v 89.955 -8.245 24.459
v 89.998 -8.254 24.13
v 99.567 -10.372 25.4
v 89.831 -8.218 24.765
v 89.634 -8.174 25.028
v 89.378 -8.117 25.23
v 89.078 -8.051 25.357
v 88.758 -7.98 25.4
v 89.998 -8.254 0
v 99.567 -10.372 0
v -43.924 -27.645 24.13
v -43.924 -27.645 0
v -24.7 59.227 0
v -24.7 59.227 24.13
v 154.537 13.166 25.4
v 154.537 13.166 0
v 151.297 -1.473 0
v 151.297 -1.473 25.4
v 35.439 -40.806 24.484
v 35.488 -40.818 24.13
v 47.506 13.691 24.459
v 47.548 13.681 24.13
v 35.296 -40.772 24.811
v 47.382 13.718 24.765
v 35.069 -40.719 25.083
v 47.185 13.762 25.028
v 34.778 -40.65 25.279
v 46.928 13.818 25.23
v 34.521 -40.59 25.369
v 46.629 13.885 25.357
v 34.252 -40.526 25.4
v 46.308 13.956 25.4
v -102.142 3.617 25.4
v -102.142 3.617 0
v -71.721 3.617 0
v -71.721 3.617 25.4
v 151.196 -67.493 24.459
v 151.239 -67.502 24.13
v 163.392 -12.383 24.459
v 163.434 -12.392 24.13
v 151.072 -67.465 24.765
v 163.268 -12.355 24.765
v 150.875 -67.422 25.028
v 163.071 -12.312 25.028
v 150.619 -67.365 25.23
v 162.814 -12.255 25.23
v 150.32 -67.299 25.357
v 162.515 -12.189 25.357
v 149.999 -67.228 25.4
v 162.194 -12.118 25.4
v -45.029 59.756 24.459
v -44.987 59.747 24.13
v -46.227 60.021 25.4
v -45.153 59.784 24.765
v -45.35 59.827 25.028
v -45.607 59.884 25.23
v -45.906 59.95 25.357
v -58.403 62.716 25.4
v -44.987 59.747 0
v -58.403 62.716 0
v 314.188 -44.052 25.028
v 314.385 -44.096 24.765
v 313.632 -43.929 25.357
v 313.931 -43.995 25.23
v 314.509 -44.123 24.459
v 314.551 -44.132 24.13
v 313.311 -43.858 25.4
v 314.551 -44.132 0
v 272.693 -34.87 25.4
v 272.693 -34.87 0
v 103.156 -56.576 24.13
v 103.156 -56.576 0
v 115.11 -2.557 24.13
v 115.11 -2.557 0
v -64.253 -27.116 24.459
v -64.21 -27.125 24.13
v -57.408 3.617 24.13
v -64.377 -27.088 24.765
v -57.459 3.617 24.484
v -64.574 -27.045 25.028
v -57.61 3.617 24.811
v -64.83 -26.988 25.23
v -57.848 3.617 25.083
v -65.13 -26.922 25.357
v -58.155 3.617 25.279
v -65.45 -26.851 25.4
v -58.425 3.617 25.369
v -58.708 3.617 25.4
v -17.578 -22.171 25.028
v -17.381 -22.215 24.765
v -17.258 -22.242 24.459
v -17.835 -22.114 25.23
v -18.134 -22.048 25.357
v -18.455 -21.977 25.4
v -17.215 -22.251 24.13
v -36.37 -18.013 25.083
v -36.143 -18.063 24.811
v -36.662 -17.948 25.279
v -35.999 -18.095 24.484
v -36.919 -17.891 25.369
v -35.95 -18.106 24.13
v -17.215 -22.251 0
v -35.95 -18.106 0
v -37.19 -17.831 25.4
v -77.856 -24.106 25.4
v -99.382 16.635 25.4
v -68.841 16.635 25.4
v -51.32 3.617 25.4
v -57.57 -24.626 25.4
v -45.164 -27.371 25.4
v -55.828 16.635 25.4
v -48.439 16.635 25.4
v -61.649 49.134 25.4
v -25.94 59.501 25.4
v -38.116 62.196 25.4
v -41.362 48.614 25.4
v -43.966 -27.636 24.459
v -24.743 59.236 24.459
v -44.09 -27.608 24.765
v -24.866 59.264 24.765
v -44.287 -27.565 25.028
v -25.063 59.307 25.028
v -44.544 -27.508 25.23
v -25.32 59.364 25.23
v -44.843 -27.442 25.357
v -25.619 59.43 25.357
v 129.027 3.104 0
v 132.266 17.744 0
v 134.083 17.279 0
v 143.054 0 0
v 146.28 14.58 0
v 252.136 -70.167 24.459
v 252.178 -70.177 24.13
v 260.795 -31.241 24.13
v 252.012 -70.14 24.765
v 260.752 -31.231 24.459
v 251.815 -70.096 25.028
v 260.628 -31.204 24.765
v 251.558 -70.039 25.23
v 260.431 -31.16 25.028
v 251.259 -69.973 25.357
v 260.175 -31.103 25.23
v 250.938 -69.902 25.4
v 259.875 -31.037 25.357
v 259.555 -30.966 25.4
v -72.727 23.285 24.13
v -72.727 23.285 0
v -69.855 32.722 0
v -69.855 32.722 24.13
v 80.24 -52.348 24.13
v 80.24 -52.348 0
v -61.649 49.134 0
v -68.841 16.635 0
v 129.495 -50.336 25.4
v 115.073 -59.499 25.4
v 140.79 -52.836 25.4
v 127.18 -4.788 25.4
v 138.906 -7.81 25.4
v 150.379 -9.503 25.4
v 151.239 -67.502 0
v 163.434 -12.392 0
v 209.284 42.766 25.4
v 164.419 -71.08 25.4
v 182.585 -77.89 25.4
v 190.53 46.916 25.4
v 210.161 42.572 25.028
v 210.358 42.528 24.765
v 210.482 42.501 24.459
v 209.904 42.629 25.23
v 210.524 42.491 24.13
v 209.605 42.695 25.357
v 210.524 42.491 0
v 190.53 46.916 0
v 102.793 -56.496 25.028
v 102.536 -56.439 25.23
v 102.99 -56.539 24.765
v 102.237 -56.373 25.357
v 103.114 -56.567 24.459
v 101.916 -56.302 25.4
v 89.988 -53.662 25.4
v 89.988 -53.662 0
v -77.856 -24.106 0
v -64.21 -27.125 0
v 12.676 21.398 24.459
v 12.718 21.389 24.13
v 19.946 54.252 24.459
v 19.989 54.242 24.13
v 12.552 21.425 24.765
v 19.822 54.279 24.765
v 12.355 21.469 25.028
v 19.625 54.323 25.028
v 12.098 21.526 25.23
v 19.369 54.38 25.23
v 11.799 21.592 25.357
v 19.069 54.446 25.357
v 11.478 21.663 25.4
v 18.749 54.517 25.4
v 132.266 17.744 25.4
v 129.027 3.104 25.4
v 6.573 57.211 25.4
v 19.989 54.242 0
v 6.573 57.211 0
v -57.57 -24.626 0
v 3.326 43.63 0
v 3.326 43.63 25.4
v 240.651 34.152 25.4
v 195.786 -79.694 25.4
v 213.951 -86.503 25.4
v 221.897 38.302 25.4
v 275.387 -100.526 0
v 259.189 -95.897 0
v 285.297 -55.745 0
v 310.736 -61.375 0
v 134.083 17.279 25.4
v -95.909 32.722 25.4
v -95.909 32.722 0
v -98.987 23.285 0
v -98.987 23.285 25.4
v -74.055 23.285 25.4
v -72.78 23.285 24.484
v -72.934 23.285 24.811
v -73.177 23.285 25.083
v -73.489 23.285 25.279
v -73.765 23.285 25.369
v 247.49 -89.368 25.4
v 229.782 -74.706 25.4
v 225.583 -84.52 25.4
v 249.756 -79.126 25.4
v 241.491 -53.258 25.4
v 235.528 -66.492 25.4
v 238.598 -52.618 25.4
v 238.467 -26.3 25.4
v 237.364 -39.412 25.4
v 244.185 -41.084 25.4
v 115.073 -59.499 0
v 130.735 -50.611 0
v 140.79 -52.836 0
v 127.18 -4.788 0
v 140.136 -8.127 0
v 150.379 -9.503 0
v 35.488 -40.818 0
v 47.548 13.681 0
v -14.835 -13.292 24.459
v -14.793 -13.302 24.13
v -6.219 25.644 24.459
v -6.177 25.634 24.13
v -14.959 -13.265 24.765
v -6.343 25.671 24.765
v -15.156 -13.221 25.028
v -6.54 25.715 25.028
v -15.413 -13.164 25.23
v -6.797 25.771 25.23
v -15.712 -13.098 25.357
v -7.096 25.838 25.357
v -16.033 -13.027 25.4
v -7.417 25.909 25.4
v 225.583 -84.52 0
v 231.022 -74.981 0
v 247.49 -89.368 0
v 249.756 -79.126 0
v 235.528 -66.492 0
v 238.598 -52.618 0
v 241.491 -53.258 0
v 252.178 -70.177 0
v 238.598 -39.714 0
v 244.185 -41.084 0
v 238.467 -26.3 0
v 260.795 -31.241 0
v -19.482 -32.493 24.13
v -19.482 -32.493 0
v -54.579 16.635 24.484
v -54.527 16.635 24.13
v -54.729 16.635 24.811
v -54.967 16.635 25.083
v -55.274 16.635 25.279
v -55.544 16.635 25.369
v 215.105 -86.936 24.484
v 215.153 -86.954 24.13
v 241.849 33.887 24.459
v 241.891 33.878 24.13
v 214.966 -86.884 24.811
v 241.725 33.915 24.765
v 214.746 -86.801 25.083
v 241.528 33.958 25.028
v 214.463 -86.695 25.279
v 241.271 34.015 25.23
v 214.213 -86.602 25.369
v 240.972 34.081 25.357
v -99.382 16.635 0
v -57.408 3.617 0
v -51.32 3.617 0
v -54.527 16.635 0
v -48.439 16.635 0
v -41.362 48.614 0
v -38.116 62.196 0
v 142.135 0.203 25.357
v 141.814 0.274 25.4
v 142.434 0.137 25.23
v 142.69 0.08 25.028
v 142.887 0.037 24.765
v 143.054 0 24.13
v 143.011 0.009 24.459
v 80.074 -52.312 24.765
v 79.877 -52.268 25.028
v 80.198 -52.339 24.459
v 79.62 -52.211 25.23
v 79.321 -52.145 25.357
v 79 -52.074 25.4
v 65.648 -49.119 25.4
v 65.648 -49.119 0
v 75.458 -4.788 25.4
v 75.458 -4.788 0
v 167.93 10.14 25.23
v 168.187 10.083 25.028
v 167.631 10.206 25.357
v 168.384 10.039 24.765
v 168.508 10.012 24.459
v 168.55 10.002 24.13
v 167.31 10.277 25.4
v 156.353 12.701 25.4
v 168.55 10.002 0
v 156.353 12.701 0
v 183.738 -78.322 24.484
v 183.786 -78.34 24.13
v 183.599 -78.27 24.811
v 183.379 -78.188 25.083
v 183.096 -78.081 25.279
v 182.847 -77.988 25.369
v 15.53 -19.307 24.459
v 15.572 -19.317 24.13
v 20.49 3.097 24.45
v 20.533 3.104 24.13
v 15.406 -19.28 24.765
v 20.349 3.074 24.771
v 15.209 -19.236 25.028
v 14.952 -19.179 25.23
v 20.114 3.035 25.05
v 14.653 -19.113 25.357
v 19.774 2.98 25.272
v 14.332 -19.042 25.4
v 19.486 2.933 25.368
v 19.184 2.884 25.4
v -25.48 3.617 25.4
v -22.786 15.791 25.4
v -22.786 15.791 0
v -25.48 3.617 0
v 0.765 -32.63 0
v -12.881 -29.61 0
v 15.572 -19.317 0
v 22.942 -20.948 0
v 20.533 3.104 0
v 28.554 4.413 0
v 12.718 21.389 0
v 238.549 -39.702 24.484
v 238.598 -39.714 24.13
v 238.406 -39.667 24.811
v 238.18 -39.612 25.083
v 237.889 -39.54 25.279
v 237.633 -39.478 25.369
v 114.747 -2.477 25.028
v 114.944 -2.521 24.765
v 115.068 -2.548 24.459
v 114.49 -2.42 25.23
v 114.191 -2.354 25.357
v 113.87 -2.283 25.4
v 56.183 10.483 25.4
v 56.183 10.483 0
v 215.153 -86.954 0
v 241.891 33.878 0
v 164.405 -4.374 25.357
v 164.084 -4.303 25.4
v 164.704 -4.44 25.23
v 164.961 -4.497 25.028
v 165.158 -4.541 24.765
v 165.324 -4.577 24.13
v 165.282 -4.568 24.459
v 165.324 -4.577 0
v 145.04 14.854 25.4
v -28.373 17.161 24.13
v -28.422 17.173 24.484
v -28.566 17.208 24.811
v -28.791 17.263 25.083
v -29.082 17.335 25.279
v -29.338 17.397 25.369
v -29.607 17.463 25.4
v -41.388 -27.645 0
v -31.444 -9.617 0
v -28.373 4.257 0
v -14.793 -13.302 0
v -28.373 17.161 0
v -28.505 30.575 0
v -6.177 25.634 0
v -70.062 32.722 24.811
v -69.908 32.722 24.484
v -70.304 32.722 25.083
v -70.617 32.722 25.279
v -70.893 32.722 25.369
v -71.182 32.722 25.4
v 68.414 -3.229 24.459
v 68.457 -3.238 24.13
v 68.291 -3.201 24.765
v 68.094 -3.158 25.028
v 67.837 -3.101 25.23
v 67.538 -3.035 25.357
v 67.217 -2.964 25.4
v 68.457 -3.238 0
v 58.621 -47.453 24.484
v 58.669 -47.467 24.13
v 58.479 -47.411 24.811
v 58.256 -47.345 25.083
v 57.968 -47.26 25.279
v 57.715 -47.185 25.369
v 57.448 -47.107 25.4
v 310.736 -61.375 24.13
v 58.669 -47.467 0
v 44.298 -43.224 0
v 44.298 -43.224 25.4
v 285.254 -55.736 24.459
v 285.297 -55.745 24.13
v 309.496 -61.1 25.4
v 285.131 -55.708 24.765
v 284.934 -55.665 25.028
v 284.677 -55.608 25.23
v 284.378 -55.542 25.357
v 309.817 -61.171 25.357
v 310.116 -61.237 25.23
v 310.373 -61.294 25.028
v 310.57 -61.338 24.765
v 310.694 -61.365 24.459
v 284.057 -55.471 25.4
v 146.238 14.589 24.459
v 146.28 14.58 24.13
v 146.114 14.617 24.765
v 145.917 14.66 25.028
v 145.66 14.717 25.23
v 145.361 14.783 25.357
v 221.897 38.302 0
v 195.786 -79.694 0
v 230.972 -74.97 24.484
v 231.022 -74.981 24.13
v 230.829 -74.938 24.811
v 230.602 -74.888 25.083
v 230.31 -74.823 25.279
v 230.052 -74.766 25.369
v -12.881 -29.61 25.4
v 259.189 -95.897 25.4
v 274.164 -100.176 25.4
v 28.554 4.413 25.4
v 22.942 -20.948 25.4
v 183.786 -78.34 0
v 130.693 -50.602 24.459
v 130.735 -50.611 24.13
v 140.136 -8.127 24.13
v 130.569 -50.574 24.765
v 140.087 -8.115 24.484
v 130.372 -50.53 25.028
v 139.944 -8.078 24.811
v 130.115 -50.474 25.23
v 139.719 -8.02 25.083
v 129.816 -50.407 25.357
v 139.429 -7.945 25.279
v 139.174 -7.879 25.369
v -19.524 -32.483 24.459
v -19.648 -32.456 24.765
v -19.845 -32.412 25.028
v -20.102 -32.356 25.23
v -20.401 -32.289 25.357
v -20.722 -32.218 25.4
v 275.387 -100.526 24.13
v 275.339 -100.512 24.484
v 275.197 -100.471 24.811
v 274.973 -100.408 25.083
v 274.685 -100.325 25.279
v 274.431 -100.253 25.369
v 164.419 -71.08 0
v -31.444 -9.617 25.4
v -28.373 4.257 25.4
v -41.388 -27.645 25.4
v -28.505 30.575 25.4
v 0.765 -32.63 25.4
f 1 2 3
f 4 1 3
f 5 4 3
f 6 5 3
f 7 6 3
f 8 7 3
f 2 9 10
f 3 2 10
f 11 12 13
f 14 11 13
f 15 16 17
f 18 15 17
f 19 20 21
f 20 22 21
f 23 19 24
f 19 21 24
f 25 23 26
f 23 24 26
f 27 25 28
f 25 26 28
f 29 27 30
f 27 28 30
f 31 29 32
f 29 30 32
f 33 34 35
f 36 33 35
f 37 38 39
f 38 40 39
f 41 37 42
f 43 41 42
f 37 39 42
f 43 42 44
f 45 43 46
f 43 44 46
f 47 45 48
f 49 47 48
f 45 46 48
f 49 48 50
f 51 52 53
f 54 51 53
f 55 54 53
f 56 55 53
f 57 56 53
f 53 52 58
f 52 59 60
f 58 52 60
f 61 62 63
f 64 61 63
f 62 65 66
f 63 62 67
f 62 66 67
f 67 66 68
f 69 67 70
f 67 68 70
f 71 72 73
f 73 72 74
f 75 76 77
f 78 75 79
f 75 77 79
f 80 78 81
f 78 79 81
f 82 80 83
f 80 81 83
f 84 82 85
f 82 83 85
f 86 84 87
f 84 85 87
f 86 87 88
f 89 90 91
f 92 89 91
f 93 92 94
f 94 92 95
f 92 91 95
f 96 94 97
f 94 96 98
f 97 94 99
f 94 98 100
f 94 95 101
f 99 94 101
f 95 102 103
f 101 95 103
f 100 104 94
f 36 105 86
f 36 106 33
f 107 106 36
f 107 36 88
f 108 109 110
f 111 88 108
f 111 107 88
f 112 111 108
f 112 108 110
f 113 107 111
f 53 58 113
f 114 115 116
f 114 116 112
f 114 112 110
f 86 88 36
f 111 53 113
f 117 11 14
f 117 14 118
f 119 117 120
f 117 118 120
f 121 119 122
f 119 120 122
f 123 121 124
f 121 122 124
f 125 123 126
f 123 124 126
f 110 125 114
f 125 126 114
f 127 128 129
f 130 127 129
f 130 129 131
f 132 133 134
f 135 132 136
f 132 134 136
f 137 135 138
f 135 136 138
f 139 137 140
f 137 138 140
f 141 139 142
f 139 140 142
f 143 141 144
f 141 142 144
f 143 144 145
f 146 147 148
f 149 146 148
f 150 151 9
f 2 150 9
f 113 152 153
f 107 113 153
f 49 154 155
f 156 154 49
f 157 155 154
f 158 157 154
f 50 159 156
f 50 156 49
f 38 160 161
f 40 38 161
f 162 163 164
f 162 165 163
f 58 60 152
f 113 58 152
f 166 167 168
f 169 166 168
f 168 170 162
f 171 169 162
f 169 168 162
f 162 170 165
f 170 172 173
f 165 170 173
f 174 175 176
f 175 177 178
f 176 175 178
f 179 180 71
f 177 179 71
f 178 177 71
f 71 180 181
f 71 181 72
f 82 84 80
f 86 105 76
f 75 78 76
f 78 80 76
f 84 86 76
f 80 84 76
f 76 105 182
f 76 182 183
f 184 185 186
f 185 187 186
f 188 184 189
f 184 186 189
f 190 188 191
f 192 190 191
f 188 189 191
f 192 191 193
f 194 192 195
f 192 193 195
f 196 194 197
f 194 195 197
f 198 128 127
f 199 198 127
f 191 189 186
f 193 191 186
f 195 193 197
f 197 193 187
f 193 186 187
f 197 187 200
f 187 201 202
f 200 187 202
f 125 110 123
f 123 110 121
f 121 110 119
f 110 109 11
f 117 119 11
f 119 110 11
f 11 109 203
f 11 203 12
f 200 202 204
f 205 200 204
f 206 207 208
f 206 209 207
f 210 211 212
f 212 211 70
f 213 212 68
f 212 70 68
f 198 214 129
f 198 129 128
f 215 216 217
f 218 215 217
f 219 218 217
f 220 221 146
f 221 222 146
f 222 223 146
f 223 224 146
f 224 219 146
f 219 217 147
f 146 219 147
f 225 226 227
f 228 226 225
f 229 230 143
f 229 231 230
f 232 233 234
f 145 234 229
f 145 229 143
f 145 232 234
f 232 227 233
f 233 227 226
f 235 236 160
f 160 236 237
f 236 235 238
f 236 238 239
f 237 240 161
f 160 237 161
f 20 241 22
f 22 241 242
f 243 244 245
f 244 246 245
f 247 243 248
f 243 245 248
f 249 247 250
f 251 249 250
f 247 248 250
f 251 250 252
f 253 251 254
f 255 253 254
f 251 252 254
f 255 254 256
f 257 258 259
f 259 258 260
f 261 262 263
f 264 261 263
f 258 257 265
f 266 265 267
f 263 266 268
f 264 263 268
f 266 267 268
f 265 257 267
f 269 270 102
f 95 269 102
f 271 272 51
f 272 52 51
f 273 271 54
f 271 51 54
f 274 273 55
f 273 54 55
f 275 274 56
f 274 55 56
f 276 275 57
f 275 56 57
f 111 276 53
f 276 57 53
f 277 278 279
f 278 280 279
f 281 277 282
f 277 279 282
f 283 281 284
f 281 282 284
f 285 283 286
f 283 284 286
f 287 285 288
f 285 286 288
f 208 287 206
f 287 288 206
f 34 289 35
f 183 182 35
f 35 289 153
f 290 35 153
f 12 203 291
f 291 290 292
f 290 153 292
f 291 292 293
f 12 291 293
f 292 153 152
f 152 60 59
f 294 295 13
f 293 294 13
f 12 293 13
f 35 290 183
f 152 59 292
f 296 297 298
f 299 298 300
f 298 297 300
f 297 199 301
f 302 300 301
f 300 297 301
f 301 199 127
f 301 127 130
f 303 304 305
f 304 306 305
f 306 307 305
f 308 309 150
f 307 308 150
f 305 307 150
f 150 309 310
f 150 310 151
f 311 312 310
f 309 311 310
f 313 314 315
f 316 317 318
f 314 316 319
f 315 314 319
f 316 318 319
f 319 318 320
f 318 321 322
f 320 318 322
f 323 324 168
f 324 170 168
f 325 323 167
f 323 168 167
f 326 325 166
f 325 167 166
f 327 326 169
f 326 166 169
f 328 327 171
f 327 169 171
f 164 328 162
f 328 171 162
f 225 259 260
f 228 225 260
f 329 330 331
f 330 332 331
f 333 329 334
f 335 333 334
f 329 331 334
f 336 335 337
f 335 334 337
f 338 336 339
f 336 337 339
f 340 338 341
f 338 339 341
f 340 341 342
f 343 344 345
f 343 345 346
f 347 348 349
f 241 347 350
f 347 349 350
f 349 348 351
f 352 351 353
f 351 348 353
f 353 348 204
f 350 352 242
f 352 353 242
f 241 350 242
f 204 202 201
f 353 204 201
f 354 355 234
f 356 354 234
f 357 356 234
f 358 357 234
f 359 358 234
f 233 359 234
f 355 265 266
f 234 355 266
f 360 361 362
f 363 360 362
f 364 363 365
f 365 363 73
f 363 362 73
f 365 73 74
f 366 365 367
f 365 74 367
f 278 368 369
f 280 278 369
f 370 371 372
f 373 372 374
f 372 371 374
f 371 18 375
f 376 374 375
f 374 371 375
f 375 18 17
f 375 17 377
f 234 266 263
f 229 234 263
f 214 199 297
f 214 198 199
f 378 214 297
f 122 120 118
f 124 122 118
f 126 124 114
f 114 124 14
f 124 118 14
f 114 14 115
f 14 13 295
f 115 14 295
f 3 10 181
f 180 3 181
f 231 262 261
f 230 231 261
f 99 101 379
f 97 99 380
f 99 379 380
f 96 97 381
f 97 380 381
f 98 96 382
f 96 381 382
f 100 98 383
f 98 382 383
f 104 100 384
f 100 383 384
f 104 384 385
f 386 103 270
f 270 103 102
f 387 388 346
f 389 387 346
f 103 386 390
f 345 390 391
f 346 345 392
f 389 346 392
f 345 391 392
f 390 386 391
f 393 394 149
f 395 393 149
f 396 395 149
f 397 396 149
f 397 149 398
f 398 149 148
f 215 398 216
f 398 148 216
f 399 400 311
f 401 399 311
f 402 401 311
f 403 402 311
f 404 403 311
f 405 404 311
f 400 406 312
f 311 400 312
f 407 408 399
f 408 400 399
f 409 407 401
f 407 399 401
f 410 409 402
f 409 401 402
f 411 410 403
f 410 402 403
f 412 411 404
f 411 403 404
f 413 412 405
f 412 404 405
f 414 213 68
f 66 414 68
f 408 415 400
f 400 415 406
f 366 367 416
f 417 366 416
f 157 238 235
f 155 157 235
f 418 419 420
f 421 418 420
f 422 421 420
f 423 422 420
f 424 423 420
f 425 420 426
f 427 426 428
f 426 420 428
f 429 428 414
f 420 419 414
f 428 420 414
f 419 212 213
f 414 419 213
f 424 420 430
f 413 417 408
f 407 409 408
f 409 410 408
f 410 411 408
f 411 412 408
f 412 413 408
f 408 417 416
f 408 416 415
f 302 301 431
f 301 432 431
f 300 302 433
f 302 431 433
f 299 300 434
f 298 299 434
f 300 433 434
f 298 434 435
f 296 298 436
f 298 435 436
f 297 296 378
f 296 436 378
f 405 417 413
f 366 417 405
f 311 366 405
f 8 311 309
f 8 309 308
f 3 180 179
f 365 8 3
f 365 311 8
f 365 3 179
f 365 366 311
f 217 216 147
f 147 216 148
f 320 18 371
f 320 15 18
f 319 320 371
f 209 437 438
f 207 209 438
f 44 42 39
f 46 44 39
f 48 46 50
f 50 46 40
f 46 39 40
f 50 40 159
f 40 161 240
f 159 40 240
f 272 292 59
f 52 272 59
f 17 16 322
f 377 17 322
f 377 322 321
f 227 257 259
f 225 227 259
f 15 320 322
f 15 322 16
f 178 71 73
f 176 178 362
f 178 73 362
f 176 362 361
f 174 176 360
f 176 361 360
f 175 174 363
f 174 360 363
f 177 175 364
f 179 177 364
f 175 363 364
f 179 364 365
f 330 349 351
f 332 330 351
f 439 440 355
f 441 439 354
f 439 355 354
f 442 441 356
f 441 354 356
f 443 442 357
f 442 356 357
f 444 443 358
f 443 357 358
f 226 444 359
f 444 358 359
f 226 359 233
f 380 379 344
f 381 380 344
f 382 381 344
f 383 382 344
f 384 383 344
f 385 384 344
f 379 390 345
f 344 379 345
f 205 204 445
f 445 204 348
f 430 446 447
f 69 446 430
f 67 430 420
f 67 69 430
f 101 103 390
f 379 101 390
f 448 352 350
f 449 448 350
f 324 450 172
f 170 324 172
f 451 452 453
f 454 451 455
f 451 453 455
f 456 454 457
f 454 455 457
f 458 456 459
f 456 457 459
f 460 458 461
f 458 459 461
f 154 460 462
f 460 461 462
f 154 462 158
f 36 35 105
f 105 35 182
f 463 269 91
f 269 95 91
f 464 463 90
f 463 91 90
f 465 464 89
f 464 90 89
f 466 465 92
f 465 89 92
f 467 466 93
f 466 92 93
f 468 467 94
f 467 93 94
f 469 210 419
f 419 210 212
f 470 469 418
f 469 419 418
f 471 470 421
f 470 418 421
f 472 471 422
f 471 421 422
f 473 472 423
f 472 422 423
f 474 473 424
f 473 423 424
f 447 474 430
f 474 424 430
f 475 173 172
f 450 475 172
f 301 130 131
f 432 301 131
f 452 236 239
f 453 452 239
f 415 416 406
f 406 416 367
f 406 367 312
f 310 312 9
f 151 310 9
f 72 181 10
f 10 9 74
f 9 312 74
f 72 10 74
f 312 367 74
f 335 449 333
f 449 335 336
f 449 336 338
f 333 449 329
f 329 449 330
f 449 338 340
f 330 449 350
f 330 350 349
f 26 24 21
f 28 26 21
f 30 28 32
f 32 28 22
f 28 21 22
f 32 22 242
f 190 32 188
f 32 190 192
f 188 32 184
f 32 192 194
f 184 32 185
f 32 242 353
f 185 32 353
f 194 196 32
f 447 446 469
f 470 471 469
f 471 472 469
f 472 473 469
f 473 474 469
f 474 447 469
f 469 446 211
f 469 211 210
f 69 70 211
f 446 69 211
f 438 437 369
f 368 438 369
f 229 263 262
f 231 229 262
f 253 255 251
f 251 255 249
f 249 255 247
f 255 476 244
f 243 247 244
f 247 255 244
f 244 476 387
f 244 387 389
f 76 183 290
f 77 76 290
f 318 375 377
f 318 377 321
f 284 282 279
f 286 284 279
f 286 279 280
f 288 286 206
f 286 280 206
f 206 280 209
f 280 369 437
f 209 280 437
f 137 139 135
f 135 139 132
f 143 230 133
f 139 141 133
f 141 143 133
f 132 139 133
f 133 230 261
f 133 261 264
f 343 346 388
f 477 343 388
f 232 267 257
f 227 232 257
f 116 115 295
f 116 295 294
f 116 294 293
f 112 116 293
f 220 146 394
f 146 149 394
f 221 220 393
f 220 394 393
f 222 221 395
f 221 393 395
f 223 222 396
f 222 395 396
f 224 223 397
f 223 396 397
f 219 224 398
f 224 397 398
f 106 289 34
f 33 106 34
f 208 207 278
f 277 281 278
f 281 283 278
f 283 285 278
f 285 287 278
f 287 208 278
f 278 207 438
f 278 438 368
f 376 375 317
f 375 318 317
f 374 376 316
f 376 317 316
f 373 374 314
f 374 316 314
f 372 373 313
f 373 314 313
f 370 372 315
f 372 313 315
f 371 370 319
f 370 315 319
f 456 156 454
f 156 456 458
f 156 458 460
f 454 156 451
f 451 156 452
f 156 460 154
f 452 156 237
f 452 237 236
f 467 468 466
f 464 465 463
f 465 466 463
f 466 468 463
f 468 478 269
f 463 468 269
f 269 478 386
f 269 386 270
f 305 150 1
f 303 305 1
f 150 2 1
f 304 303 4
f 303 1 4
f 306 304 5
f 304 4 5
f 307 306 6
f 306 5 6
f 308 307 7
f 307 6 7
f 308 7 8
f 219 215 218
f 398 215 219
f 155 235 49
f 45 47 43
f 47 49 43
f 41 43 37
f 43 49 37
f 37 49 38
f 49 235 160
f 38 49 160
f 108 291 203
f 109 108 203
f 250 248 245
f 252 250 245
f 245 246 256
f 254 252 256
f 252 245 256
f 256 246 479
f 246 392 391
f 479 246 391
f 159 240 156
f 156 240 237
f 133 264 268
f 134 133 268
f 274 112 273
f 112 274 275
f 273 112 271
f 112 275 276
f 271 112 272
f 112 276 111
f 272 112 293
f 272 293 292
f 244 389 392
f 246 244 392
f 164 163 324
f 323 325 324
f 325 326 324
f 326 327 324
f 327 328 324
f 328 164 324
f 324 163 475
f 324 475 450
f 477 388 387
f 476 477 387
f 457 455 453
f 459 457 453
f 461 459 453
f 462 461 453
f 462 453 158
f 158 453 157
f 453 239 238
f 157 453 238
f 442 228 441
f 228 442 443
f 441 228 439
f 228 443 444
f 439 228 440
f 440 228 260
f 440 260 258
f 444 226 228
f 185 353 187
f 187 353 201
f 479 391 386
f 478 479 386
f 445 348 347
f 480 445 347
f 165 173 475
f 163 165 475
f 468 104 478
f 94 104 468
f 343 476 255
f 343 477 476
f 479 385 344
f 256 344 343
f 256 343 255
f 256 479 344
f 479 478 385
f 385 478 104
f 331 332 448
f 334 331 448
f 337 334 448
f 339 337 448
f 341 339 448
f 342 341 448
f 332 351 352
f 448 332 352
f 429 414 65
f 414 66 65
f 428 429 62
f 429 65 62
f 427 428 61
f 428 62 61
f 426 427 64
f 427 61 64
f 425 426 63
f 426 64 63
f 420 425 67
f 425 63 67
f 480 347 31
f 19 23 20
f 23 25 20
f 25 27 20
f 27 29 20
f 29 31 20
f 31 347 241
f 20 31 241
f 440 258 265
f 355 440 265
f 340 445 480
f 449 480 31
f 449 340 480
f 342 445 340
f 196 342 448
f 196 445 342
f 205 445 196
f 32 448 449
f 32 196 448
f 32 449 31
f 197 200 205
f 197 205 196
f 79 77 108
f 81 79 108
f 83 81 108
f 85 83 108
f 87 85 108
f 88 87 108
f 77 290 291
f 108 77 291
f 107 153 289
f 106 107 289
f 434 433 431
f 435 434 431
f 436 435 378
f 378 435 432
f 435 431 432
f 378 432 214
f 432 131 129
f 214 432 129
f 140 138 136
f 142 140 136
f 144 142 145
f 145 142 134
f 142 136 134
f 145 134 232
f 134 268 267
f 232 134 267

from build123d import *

# Parameters (mm, degrees)
F1_DEPTH = 25.4
F2_R     = 1.27
F2_2_R   = 1.27
F2_3_R   = 1.27
F2_4_R   = 1.27
F2_5_R   = 1.27
F2_6_R   = 1.27
F2_7_R   = 1.27
F2_8_R   = 1.27
F2_9_R   = 1.27
F2_10_R  = 1.27
F2_11_R  = 1.27
F2_12_R  = 1.27


with BuildPart() as f1:
    # F0 (on Top) → F1 (new body)
    with BuildSketch(Plane.XY):
        Polygon((-69.8548853397, 32.7220372856), (-95.9094241261, 32.7220372856), (-98.9867299795, 23.2849624008), (-72.7270394564, 23.2849624008), align=None)
    extrude(amount=F1_DEPTH)

    # F2#3
    f2_3_edges = [f1.edges().sort_by_distance(p)[0] for p in [
        (-71.290962, 28.0035, 25.4),
    ]]
    fillet(f2_3_edges, radius=F2_3_R)


with BuildPart() as f1b:
    # F0 (on Top) → F1, piece 2 (new body)
    with BuildSketch(Plane.XY):
        Polygon((-71.7212715714, 3.6166611477), (-68.8405496484, 16.6346058249), (-99.3820875883, 16.6346058249), (-102.1422967315, 3.6166611477), align=None)
        Polygon((-54.5269044594, 16.6346058249), (-68.8405496484, 16.6346058249), (-71.7212715714, 3.6166611477), (-57.4076263824, 3.6166611477), align=None)
        Polygon((-48.4391301191, 16.6346058249), (-54.5269044594, 16.6346058249), (-57.4076263824, 3.6166611477), (-51.3198520421, 3.6166611477), align=None)
        Polygon((-57.4076263824, 3.6166611477), (-71.7212715714, 3.6166611477), (-77.8558850288, -24.1055767983), (-64.2104384761, -27.1251576928), align=None)
        Polygon((-41.3623726554, 48.6143802077), (-48.4391301191, 16.6346058249), (-51.3198520421, 3.6166611477), (-57.5695274957, -24.6255404531), (-43.9240809429, -27.6451213476), (-24.7002538621, 59.227101697), (-38.1161585192, 62.1958876015), align=None)
        Polygon((-58.4025160524, 62.7158512563), (-61.6487301886, 49.1343438625), (-68.8405496484, 16.6346058249), (-54.5269044594, 16.6346058249), (-44.9866113953, 59.7470653518), align=None)
    extrude(amount=F1_DEPTH)

    # F2
    f2_edges = [f1b.edges().sort_by_distance(p)[0] for p in [
        (-49.756758, 38.190836, 25.4),
        (-60.809032, -11.754248, 25.4),
        (-34.312167, 15.79099, 25.4),
    ]]
    fillet(f2_edges, radius=F2_R)


with BuildPart() as f1c:
    # F0 (on Top) → F1, piece 3 (new body)
    with BuildSketch(Plane.XY):
        Polygon((-28.3734610908, 17.1608142555), (-22.7862559259, 15.7909901747), (-25.4802953765, 3.6166611477), (-28.3734610908, 4.2568855538), (-31.4436152838, -9.6171010728), (-14.7930985255, -13.3016695545), (-6.1770153091, 25.6342977637), (-28.5048495002, 30.5751915101), (-41.3883373142, -27.6451213476), (-19.4815568018, -32.4928407418), (-17.2152607297, -22.2514784453), (-35.9498564836, -18.1057271732), align=None)
    extrude(amount=F1_DEPTH)

    # F2#2
    f2_2_edges = [f1c.edges().sort_by_distance(p)[0] for p in [
        (-32.161659, -0.472456, 25.4),
        (-10.485057, 6.166314, 25.4),
        (-18.348409, -27.37216, 25.4),
    ]]
    fillet(f2_2_edges, radius=F2_2_R)


with BuildPart() as f1d:
    # F0 (on Top) → F1, piece 4 (new body)
    with BuildSketch(Plane.XY):
        Polygon((6.572613388, 57.2112132996), (3.3263992518, 43.6297059059), (-12.8807555884, -29.6102147549), (0.7646909643, -32.6297956495), (12.7183656054, 21.3887036461), (19.9885180452, 54.2424273952), align=None)
        Polygon((12.7183656054, 21.3887036461), (0.7646909643, -32.6297956495), (35.48804385, -40.8177809655), (47.5480636574, 13.6812907452), (34.0116305968, 16.6767482036), align=None)
        Polygon((15.5717815686, -19.3166861529), (20.5332152545, 3.103967756), (28.5542372746, 4.4131164266), (22.942185513, -20.9476720535), align=None, mode=Mode.SUBTRACT)
    extrude(amount=F1_DEPTH)

    # F2#4
    f2_4_edges = [f1d.edges().sort_by_distance(p)[0] for p in [
        (16.353442, 37.815566, 25.4),
        (18.052498, -8.106359, 25.4),
        (41.518054, -13.568245, 25.4),
    ]]
    fillet(f2_4_edges, radius=F2_4_R)


with BuildPart() as f1e:
    # F0 (on Top) → F1, piece 5 (new body)
    with BuildSketch(Plane.XY):
        Polygon((56.1828884811, 10.4826177451), (44.2982874811, -43.2237386703), (58.6694051347, -47.4670261571), (68.4567379189, -3.2381973674), (75.4580601084, -4.7875097068), (65.647936566, -49.1193296343), (80.2400389419, -52.3483946103), (89.9975491157, -8.2543338071), (99.5671160161, -10.3719692593), (89.9875708898, -53.6618083416), (103.1564025063, -56.5759198146), (115.1101039259, -2.5572995076), align=None)
    extrude(amount=F1_DEPTH)

    # F2#5
    f2_5_edges = [f1e.edges().sort_by_distance(p)[0] for p in [
        (63.563072, -25.352612, 25.4),
        (85.118794, -30.301364, 25.4),
        (109.133253, -29.56661, 25.4),
    ]]
    fillet(f2_5_edges, radius=F2_5_R)


with BuildPart() as f1f:
    # F0 (on Top) → F1, piece 6 (new body)
    with BuildSketch(Plane.XY):
        Polygon((140.1360348006, -8.127430539), (127.180442214, -4.7875097068), (115.0733747565, -59.4991891328), (151.2385817677, -67.5021348565), (163.4337717843, -12.3922307393), (150.379428067, -9.503454126), (140.7904268017, -52.8360253771), (130.7349386316, -50.6108611184), align=None)
    extrude(amount=F1_DEPTH)

    # F2#6
    f2_6_edges = [f1f.edges().sort_by_distance(p)[0] for p in [
        (135.435487, -29.369146, 25.4),
        (157.336177, -39.947183, 25.4),
    ]]
    fillet(f2_6_edges, radius=F2_6_R)


with BuildPart() as f1g:
    # F0 (on Top) → F1, piece 7 (new body)
    with BuildSketch(Plane.XY):
        Polygon((154.5366714331, 13.1664413276), (151.2970328331, -1.473443117), (165.3238225088, -4.577410873), (168.5501596656, 10.0023645234), (156.3529807509, 12.7014603922), align=None)
    extrude(amount=F1_DEPTH)

    # F2#12
    f2_12_edges = [f1g.edges().sort_by_distance(p)[0] for p in [
        (166.936991, 2.712477, 25.4),
    ]]
    fillet(f2_12_edges, radius=F2_12_R)


with BuildPart() as f1h:
    # F0 (on Top) → F1, piece 8 (new body)
    with BuildSketch(Plane.XY):
        Polygon((132.2664687964, 17.7438522006), (129.0268301964, 3.103967756), (143.0536198721, 0), (146.2799570289, 14.5797753965), (134.0827781142, 17.2788712652), align=None)
    extrude(amount=F1_DEPTH)

    # F2#11
    f2_11_edges = [f1h.edges().sort_by_distance(p)[0] for p in [
        (144.666788, 7.289888, 25.4),
    ]]
    fillet(f2_11_edges, radius=F2_11_R)


with BuildPart() as f1i:
    # F0 (on Top) → F1, piece 9 (new body)
    with BuildSketch(Plane.XY):
        Polygon((190.5303888261, 46.9159626722), (164.4191592932, -71.0803419352), (183.785862088, -78.3399934819), (210.5244860124, 42.4914981716), align=None)
    extrude(amount=F1_DEPTH)

    # F2#7
    f2_7_edges = [f1i.edges().sort_by_distance(p)[0] for p in [
        (197.155174, -17.924248, 25.4),
    ]]
    fillet(f2_7_edges, radius=F2_7_R)


with BuildPart() as f1j:
    # F0 (on Top) → F1, piece 10 (new body)
    with BuildSketch(Plane.XY):
        Polygon((221.8970649182, 38.3023613453), (195.7858353853, -79.6939432621), (215.1525381802, -86.9535948088), (241.8911621046, 33.8778968447), align=None)
    extrude(amount=F1_DEPTH)

    # F2#8
    f2_8_edges = [f1j.edges().sort_by_distance(p)[0] for p in [
        (228.52185, -26.537849, 25.4),
    ]]
    fillet(f2_8_edges, radius=F2_8_R)


with BuildPart() as f1k:
    # F0 (on Top) → F1, piece 11 (new body)
    with BuildSketch(Plane.XY):
        Polygon((238.5980570085, -39.7141671486), (244.1852621734, -41.0839912294), (241.4912227229, -53.2583202564), (238.5980570085, -52.6180958503), (235.5279028156, -66.4920824768), (252.1784195738, -70.1766509586), (260.7945027903, -31.2406836404), (238.4666685992, -26.299789894), (225.5831807852, -84.5201027517), (247.4899612975, -89.3678221459), (249.7562573696, -79.1264598494), (231.0216616157, -74.9807085772), align=None)
    extrude(amount=F1_DEPTH)

    # F2#9
    f2_9_edges = [f1k.edges().sort_by_distance(p)[0] for p in [
        (234.809859, -57.347438, 25.4),
        (256.486461, -50.708667, 25.4),
    ]]
    fillet(f2_9_edges, radius=F2_9_R)


with BuildPart() as f1l:
    # F0 (on Top) → F1, piece 12 (new body)
    with BuildSketch(Plane.XY):
        Polygon((272.6933962275, -34.8696600853), (259.1887116432, -95.8971530199), (275.3872373663, -100.5259149405), (285.2966893195, -55.745231224), (310.7359760515, -61.3746537489), (314.5514941669, -44.1323773097), align=None)
    extrude(amount=F1_DEPTH)

    # F2#10
    f2_10_edges = [f1l.edges().sort_by_distance(p)[0] for p in [
        (280.341963, -78.135573, 25.4),
        (312.643735, -52.753516, 25.4),
    ]]
    fillet(f2_10_edges, radius=F2_10_R)


solid = Compound([f1.part, f1b.part, f1c.part, f1d.part, f1e.part, f1f.part, f1g.part, f1h.part, f1i.part, f1j.part, f1k.part, f1l.part])
